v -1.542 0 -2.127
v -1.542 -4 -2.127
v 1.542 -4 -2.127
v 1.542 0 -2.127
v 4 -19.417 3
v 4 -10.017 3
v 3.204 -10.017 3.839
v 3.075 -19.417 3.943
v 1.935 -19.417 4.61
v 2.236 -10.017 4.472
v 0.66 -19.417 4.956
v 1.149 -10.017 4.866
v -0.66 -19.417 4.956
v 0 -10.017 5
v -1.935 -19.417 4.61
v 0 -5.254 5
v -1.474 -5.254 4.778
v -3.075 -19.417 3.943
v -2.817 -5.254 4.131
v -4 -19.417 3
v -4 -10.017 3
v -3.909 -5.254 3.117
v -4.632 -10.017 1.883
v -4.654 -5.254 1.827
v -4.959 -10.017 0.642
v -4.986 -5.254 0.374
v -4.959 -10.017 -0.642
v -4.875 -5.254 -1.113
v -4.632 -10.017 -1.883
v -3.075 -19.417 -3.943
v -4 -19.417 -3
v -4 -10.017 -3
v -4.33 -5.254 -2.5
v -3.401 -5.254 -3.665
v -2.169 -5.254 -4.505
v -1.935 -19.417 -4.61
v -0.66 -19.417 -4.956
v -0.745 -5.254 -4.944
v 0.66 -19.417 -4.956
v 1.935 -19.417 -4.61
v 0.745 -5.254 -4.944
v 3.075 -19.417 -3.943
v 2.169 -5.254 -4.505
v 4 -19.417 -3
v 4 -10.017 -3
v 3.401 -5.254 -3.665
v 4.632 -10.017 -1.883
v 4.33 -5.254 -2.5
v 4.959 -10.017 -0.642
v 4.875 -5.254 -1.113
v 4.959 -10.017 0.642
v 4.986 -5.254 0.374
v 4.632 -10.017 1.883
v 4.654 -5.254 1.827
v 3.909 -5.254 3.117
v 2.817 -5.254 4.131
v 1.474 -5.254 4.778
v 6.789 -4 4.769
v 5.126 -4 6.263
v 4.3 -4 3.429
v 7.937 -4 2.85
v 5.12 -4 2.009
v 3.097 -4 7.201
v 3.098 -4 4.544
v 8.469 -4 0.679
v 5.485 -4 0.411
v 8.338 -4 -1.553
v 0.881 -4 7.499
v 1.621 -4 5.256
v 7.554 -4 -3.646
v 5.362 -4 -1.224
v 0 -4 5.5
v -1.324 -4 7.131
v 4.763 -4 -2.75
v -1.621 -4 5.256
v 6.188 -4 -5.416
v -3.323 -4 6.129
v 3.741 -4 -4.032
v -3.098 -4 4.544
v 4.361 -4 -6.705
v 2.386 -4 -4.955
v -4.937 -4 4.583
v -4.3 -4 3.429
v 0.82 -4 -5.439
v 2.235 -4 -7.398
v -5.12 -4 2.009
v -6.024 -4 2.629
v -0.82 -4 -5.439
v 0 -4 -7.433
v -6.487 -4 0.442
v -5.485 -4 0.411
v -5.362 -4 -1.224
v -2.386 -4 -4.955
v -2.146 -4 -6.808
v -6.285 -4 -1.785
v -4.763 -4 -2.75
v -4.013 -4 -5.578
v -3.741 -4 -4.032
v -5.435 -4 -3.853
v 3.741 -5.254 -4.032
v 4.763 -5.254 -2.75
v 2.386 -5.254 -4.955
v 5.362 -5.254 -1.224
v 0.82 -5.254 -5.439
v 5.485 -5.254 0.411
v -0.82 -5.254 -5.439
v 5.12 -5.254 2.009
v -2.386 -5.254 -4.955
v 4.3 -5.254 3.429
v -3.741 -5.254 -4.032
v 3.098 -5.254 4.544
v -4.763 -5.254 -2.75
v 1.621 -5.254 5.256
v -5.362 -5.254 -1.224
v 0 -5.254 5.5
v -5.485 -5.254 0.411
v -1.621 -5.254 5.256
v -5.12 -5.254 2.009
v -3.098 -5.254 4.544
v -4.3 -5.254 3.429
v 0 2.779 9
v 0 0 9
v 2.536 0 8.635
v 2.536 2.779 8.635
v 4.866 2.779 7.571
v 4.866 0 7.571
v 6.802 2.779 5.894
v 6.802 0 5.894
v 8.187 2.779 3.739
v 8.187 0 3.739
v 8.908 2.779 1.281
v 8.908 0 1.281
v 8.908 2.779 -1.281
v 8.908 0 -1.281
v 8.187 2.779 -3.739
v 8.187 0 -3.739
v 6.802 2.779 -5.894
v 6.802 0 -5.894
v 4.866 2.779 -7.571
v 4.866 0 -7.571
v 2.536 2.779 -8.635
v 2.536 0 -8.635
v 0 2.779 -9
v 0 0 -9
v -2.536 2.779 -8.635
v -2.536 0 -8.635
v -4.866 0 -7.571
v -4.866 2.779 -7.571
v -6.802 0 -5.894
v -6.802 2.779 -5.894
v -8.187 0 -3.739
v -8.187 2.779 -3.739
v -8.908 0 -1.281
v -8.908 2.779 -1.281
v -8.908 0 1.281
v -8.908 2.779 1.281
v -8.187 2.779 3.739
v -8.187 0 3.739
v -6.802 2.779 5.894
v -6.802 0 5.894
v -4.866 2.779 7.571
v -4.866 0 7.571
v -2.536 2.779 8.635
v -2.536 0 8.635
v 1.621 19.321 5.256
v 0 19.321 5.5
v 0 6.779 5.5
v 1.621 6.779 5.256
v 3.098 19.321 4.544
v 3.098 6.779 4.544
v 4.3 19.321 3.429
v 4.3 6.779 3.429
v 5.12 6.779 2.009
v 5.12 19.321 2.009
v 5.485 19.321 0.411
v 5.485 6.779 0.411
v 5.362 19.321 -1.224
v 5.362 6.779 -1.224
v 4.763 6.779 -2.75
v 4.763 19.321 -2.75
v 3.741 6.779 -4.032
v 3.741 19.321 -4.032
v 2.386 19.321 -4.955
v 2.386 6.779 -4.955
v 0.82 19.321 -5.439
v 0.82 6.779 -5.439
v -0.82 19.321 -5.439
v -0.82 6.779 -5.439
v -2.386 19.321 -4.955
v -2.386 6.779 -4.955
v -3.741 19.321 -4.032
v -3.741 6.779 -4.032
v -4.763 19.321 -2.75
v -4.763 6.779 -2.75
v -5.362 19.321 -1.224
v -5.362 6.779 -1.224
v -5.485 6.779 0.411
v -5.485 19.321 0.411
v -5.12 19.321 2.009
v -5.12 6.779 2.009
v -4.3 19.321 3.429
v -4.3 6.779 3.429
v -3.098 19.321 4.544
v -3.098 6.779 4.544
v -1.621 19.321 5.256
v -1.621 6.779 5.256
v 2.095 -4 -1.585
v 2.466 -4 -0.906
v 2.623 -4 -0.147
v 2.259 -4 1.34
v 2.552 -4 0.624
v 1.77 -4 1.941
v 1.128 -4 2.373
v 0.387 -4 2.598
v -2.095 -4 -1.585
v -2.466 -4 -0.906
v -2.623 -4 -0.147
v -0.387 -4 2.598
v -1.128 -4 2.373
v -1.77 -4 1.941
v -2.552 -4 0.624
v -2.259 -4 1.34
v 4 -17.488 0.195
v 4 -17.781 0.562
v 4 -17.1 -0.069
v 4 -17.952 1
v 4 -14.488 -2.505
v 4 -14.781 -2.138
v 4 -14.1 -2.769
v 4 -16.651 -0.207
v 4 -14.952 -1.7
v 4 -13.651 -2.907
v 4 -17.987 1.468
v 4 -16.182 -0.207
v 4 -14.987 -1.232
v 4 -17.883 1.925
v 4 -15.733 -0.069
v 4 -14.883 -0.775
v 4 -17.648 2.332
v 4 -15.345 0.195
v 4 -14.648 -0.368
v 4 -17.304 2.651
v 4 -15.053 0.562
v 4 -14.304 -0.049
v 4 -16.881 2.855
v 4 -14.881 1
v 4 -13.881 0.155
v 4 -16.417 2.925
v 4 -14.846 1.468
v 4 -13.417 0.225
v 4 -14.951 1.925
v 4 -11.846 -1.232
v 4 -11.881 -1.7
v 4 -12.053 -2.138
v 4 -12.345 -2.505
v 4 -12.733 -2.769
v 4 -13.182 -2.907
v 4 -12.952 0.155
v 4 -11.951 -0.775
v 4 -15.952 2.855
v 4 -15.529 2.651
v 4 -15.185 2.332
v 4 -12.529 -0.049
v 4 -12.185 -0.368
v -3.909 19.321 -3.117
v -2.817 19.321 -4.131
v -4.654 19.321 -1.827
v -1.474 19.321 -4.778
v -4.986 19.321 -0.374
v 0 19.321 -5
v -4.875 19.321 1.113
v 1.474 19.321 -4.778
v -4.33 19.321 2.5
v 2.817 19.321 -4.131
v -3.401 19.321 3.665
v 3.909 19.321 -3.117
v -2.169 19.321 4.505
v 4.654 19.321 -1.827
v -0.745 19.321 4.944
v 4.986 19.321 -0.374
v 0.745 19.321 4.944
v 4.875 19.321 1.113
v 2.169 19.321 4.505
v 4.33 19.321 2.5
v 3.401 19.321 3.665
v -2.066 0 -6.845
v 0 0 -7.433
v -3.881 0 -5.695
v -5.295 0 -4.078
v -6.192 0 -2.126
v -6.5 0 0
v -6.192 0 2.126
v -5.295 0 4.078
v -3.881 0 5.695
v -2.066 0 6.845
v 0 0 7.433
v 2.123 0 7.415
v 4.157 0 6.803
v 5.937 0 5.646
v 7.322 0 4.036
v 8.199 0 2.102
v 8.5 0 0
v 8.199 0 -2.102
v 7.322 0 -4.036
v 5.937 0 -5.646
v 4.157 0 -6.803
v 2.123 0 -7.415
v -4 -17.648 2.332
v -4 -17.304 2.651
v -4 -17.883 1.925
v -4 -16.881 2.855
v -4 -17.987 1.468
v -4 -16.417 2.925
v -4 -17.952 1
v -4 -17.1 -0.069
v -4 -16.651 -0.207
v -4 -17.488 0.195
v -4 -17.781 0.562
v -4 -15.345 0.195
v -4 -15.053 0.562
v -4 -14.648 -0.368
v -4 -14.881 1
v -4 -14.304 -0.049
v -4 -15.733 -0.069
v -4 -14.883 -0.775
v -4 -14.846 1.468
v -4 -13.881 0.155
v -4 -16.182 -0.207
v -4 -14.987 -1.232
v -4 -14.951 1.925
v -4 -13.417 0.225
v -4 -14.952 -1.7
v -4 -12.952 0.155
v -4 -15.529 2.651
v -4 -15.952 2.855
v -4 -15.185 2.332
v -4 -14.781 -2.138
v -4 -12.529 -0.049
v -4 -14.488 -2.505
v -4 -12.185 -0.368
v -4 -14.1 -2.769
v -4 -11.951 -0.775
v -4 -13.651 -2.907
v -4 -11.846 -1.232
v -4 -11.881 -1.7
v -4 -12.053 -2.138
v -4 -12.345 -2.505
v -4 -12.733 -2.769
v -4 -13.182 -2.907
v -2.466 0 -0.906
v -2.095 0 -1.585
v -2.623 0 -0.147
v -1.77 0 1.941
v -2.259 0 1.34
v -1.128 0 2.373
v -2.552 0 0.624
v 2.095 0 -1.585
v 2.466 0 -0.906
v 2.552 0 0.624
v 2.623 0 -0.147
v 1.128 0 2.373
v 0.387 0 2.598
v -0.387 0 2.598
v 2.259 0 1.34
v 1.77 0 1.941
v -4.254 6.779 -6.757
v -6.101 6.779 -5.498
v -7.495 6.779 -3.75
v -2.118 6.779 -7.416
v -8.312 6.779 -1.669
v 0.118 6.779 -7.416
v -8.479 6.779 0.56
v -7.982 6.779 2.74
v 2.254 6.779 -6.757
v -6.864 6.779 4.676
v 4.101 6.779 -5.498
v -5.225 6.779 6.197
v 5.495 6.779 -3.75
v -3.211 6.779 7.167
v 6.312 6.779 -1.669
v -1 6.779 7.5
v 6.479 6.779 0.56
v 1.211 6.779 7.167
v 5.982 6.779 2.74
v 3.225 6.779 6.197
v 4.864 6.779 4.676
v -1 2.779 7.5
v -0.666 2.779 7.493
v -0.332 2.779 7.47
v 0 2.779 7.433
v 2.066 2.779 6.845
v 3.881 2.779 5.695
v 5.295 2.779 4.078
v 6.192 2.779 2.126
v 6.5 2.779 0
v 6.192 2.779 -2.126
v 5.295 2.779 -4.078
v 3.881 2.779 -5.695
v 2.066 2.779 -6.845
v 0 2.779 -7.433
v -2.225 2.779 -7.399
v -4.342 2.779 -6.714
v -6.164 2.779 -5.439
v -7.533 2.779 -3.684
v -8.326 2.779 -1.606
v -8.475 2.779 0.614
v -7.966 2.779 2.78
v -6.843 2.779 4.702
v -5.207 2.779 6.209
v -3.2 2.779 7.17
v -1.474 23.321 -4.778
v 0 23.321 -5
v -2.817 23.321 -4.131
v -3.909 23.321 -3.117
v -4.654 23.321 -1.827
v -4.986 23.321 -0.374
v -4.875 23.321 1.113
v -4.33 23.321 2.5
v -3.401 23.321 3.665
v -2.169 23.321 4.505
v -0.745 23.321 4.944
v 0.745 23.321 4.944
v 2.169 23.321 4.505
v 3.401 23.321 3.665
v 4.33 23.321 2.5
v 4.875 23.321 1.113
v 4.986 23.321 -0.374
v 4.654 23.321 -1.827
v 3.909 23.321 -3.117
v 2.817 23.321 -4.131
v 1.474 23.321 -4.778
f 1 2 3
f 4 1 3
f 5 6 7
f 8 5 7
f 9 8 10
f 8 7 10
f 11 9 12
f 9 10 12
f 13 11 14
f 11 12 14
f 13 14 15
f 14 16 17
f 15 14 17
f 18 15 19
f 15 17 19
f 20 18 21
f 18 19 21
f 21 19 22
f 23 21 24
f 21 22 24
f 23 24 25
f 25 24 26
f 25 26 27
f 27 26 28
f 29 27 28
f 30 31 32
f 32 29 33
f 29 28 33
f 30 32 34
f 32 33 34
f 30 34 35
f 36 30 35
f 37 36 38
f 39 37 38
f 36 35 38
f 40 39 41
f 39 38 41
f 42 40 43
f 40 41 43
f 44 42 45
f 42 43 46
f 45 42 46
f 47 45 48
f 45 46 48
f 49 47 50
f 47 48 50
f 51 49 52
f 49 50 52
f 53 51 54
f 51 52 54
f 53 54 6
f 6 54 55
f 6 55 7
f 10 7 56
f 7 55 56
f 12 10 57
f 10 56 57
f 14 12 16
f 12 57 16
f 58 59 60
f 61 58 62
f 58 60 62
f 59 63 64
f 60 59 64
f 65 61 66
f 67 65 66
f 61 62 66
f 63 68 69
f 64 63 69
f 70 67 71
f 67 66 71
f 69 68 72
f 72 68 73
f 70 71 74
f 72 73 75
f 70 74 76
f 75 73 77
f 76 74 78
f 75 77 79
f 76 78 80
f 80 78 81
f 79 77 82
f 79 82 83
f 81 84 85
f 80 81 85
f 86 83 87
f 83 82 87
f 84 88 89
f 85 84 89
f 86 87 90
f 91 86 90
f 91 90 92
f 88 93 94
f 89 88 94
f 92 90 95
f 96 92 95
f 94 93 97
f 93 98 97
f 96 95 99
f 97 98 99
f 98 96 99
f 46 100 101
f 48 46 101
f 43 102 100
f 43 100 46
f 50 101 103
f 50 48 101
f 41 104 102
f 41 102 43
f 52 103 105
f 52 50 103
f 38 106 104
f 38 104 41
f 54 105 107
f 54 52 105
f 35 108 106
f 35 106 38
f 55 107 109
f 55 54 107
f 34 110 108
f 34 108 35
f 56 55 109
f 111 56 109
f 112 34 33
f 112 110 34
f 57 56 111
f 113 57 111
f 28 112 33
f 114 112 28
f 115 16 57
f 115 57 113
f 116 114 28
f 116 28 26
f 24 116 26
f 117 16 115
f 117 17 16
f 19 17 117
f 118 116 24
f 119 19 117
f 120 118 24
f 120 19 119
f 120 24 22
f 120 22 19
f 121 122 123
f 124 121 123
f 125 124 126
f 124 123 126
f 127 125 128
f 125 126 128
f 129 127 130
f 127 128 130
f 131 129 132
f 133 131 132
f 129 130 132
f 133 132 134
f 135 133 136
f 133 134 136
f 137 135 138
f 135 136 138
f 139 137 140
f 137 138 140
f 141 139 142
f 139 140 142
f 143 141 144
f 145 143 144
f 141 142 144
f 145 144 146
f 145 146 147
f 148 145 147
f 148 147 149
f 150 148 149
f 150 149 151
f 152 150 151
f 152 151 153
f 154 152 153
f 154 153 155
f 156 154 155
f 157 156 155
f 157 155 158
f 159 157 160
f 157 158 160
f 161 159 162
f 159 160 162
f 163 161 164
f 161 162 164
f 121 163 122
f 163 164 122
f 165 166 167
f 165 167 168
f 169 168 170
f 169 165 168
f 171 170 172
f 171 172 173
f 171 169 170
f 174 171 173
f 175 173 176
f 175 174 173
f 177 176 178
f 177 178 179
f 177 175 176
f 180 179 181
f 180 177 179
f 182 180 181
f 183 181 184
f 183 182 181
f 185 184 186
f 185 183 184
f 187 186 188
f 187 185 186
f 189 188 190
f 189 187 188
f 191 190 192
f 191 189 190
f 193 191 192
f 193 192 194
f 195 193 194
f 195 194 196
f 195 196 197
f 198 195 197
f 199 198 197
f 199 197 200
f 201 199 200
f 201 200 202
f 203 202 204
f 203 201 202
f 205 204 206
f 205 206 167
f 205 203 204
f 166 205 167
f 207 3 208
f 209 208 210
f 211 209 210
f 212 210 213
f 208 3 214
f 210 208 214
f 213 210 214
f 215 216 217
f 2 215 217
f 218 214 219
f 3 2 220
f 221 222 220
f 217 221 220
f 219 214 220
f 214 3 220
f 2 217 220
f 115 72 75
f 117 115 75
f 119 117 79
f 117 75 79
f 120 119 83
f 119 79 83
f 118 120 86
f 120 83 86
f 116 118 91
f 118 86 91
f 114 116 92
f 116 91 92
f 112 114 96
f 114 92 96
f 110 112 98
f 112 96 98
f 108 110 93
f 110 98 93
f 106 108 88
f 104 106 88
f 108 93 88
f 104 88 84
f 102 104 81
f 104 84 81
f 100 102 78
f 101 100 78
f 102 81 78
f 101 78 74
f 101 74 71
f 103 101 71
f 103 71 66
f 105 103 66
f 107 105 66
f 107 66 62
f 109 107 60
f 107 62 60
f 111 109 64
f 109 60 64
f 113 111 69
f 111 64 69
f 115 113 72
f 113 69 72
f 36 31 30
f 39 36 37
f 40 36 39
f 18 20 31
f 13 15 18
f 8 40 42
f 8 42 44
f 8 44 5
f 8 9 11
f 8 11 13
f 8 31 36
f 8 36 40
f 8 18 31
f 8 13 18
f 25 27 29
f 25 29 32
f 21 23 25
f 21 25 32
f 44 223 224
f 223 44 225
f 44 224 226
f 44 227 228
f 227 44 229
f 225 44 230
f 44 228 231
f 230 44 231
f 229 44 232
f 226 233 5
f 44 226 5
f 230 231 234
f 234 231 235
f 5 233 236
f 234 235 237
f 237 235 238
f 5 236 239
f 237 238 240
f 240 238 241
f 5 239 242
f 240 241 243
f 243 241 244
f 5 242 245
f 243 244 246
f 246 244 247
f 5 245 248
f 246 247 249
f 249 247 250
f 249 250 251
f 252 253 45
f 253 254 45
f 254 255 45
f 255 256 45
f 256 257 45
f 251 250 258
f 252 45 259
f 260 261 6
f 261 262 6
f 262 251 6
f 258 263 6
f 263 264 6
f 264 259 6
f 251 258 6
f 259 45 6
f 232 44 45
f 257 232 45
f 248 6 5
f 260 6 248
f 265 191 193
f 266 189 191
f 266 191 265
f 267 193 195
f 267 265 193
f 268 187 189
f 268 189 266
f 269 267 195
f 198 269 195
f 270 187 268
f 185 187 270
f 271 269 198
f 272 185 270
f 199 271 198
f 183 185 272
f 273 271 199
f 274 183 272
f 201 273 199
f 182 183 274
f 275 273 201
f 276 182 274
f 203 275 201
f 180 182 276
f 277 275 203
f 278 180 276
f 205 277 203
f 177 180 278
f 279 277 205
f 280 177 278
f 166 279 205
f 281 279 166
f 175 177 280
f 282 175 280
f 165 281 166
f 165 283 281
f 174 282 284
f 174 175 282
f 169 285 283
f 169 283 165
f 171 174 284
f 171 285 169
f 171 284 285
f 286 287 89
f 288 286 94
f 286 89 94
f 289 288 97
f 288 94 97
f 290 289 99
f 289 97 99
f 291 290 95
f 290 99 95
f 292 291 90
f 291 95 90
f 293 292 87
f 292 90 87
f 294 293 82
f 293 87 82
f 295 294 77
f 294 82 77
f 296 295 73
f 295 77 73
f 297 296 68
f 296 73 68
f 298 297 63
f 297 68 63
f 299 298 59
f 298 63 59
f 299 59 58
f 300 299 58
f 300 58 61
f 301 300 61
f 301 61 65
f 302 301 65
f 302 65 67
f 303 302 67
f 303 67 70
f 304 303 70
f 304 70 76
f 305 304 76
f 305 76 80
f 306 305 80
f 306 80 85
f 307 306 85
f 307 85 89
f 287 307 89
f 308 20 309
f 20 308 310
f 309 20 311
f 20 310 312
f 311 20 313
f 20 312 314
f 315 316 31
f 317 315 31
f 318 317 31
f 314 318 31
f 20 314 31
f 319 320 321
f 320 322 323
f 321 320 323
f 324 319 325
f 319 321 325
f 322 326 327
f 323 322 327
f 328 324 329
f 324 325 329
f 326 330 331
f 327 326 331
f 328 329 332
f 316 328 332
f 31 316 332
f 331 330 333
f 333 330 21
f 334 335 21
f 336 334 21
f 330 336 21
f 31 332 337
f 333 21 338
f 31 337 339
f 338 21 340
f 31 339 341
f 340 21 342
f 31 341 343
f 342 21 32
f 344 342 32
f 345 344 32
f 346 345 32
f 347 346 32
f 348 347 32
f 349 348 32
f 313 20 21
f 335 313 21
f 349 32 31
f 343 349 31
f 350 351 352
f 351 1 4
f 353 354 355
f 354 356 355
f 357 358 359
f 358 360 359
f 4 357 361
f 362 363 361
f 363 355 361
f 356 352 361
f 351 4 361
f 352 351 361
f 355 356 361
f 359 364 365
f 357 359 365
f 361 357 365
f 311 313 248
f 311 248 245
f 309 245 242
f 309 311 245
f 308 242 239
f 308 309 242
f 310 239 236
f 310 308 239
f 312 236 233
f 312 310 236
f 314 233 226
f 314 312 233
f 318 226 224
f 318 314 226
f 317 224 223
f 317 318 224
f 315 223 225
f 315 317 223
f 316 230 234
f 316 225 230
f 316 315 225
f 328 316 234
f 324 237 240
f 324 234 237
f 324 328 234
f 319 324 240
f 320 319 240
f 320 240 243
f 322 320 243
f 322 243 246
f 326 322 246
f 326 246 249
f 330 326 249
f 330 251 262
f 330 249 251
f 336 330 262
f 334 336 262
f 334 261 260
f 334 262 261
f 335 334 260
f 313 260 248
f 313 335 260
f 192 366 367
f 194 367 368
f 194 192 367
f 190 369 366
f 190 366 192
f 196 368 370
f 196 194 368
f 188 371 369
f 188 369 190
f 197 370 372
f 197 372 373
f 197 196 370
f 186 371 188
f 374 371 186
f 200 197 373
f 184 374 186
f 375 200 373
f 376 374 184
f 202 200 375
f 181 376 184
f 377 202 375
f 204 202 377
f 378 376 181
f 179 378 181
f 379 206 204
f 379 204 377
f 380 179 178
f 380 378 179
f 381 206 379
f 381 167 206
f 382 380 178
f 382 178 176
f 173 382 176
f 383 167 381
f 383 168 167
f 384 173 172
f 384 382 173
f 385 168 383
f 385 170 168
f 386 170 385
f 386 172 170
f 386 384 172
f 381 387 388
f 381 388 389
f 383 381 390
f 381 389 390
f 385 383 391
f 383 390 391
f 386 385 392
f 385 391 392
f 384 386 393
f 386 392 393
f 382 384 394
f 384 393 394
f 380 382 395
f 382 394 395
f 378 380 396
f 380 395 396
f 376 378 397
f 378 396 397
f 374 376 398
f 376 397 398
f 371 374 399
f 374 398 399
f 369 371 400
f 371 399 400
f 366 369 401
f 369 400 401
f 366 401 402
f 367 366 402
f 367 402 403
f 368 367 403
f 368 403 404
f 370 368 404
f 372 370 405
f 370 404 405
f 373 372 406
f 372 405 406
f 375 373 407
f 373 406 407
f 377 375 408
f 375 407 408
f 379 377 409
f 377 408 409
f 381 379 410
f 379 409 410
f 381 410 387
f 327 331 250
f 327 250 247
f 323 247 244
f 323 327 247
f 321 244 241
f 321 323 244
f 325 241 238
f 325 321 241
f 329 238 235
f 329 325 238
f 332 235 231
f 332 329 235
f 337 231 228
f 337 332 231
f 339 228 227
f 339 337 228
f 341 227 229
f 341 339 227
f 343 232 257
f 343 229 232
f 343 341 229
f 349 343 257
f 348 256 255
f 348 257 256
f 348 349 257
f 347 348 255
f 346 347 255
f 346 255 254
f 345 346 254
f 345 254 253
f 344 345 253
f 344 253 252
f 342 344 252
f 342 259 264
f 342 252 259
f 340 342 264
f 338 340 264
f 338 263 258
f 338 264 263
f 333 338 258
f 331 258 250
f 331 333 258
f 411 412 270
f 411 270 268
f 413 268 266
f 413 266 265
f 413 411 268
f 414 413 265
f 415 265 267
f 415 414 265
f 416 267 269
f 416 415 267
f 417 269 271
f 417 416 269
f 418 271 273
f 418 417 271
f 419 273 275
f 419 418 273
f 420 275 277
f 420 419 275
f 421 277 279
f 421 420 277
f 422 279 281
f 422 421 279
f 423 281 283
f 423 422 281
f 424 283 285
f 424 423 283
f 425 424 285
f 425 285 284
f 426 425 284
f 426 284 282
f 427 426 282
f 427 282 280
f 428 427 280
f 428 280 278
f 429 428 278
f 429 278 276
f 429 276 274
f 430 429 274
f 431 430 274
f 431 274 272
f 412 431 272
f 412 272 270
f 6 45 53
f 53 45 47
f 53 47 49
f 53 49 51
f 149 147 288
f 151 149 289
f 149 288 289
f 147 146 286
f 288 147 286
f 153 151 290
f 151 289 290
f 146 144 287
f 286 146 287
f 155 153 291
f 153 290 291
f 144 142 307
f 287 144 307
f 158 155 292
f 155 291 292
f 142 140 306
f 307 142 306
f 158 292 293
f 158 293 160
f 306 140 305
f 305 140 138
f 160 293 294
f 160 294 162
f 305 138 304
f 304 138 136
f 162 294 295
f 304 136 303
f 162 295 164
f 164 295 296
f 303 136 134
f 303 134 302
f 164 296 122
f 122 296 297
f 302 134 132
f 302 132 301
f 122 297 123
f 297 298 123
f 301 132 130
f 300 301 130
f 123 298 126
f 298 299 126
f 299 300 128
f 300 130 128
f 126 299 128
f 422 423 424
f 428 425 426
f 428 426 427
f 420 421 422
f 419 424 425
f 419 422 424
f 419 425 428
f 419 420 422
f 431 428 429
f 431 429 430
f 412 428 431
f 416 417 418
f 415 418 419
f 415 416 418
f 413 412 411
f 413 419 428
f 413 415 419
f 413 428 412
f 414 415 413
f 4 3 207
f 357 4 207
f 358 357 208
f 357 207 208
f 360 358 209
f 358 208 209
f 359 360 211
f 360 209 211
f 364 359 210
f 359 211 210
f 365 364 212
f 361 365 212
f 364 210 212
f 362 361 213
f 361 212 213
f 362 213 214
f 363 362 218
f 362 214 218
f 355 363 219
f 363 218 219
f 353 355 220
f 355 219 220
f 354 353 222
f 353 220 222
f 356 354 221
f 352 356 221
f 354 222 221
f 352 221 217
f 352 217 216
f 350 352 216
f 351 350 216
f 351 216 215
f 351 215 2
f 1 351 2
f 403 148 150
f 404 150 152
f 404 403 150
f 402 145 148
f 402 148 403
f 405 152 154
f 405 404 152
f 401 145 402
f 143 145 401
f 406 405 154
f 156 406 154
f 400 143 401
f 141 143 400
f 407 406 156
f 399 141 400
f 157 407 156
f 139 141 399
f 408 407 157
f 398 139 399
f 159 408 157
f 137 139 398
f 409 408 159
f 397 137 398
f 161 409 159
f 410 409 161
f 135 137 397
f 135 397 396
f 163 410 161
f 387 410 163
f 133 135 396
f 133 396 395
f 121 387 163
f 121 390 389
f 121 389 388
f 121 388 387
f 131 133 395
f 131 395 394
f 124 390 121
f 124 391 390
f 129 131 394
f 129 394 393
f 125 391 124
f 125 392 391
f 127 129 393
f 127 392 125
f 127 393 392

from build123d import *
from build123d.topology import SkipClean

# Parameters (mm, degrees)
SKETCH1_R               = 7.5
BOSS_EXTRUDE1_DEPTH     = 6.779166667
SKETCH1_3_R             = 7.5
BOSS_EXTRUDE2_DEPTH     = 2.779166667
BOSS_EXTRUDE3_START     = -4
SKETCH1_4_R             = 7.5
BOSS_EXTRUDE3_DEPTH     = 4
SKETCH2_R               = 5
BOSS_EXTRUDE4_DEPTH     = 6.016666667
SKETCH2_3_R             = 5.5
SKETCH2_3_R_2           = 5
BOSS_EXTRUDE5_DEPTH     = 1.254166667
BOSS_EXTRUDE9_START     = 16.541666667
SKETCH3_R               = 5
BOSS_EXTRUDE9_DEPTH     = 16.541666667
BOSS_EXTRUDE10_START    = 12.541666667
SKETCH3_3_R             = 5.5
SKETCH3_3_R_2           = 5
BOSS_EXTRUDE10_DEPTH    = 12.541666667
BOSS_EXTRUDE11_DEPTH    = 9.4
CUT_EXTRUDE1_DEPTH      = 28.502022969
CUT_EXTRUDE1_DEPTH_BACK = 28.502022969
SKETCH5_R               = 1.575
CUT_EXTRUDE5_START      = -2.779166667
CUT_EXTRUDE5_DEPTH      = 2.779166667
BOSS_EXTRUDE12_START    = -2.779166667
SKETCH6_4_R             = 9
BOSS_EXTRUDE12_DEPTH    = 2.779166667


with BuildPart() as part:
    # Sketch1 → Boss-Extrude1 (new body)
    with BuildSketch(Plane(origin=(0, 0, 0), x_dir=(1, 0, 0), z_dir=(0, 1, 0))):
        with Locations(Location((-1, 0, 0), (0, 0, 270))):
            Circle(SKETCH1_R)
    extrude(amount=BOSS_EXTRUDE1_DEPTH)

    # Sketch1<3> → Boss-Extrude2 (add)
    with BuildSketch(Plane(origin=(0, 0, 0), x_dir=(1, 0, 0), z_dir=(0, 1, 0))):
        with Locations(Location((-1, 0, 0), (0, 0, 82.337744339))):
            Circle(SKETCH1_3_R)
        with Locations((1, 0)):
            Circle(SKETCH1_3_R)
    extrude(amount=BOSS_EXTRUDE2_DEPTH)

    # Sketch1<4> → Boss-Extrude3 (add)
    with BuildSketch(Plane(origin=(0, 0, 0), x_dir=(1, 0, 0), z_dir=(0, 1, 0)).offset(BOSS_EXTRUDE3_START)):
        with Locations(Location((1, 0, 0), (0, 0, 97.662255661))):
            Circle(SKETCH1_4_R)
        with BuildLine():
            Line((-1.54175225, 2.127), (1.54175225, 2.127))
            ThreePointArc((1.54175225, 2.127), (0, -2.627), (-1.54175225, 2.127))
        make_face(mode=Mode.SUBTRACT)
    extrude(amount=BOSS_EXTRUDE3_DEPTH)

    # Sketch2 → Boss-Extrude4 (add)
    with BuildSketch(Plane.XZ.offset(4)):
        with Locations(Location((0, 0, 0), (0, 0, 90))):
            Circle(SKETCH2_R)
    extrude(amount=BOSS_EXTRUDE4_DEPTH)

    # Sketch2<3> → Boss-Extrude5 (add)
    with BuildSketch(Plane.XZ.offset(4)):
        with Locations(Location((0, 0, 0), (0, 0, 90))):
            Circle(SKETCH2_3_R)
        with Locations(Location((0, 0, 0), (0, 0, 270))):
            Circle(SKETCH2_3_R_2, mode=Mode.SUBTRACT)
    extrude(amount=BOSS_EXTRUDE5_DEPTH)

    # Sketch3 → Boss-Extrude9 (add)
    with BuildSketch(Plane(origin=(0, 6.779166667, 0), x_dir=(1, 0, 0), z_dir=(0, 1, 0)).offset(BOSS_EXTRUDE9_START)):
        with Locations(Location((0, 0, 0), (0, 0, 90))):
            Circle(SKETCH3_R)
    extrude(amount=-BOSS_EXTRUDE9_DEPTH)

    # Sketch3<3> → Boss-Extrude10 (add)
    with BuildSketch(Plane(origin=(0, 6.779166667, 0), x_dir=(1, 0, 0), z_dir=(0, 1, 0)).offset(BOSS_EXTRUDE10_START)):
        with Locations(Location((0, 0, 0), (0, 0, 270))):
            Circle(SKETCH3_3_R)
        with Locations(Location((0, 0, 0), (0, 0, 90))):
            Circle(SKETCH3_3_R_2, mode=Mode.SUBTRACT)
    extrude(amount=-BOSS_EXTRUDE10_DEPTH)

    # Sketch4 → Boss-Extrude11 (add)
    with BuildSketch(Plane.XZ.offset(10.016666667)):
        with BuildLine():
            Line((-4, 3), (-4, -3))
            ThreePointArc((-4, -3), (0, -5), (4, -3))
            Line((4, -3), (4, 3))
            ThreePointArc((4, 3), (0, 5), (-4, 3))
        make_face()
    extrude(amount=BOSS_EXTRUDE11_DEPTH)

    # Sketch5 → Cut-Extrude1 (cut, two sides: drawn at the far end of the back side and taken through both)
    with BuildSketch(Plane(origin=(4, 0, 0), x_dir=(0, 0, -1), z_dir=(1, 0, 0)).offset(-CUT_EXTRUDE1_DEPTH_BACK)):
        with Locations(Location((-1.35, -16.416666667, 0), (0, 0, 180))):
            Circle(SKETCH5_R)
        with Locations(Location((1.35, -13.416666667, 0), (0, 0, 180))):
            Circle(SKETCH5_R)
    extrude(amount=CUT_EXTRUDE1_DEPTH + CUT_EXTRUDE1_DEPTH_BACK, mode=Mode.SUBTRACT)

    # Sketch6 → Cut-Extrude5 (cut)
    with SkipClean():  # the faces are left unmerged after this step: merging them gives an invalid solid
        with BuildSketch(Plane(origin=(0, 2.779166667, 0), x_dir=(1, 0, 0), z_dir=(0, 1, 0)).offset(CUT_EXTRUDE5_START)):
            with BuildLine():
                ThreePointArc((0, -7.433034374), (8.5, 0), (0, 7.433034374))
                ThreePointArc((0, 7.433034374), (6.5, 0), (0, -7.433034374))
            make_face()
        extrude(amount=CUT_EXTRUDE5_DEPTH, mode=Mode.SUBTRACT)

    # Sketch6<4> → Boss-Extrude12 (add)
    # profile 1 of 2: a face of its own
    with BuildSketch(Plane(origin=(0, 2.779166667, 0), x_dir=(1, 0, 0), z_dir=(0, 1, 0)).offset(BOSS_EXTRUDE12_START)):
        with Locations(Location((0, 0, 0), (0, 0, 270))):
            Circle(SKETCH6_4_R)
        with BuildLine():
            ThreePointArc((0, 7.433034374), (6.5, 0), (0, -7.433034374))
            ThreePointArc((0, -7.433034374), (8.5, 0), (0, 7.433034374))
        make_face(mode=Mode.SUBTRACT)
    # profile 2 of 2: a face of its own
    with BuildSketch(Plane(origin=(0, 2.779166667, 0), x_dir=(1, 0, 0), z_dir=(0, 1, 0)).offset(BOSS_EXTRUDE12_START)):
        with BuildLine():
            ThreePointArc((0, -7.433034374), (8.5, 0), (0, 7.433034374))
            ThreePointArc((0, 7.433034374), (6.5, 0), (0, -7.433034374))
        make_face()
    extrude(amount=BOSS_EXTRUDE12_DEPTH)


solid = part.part
